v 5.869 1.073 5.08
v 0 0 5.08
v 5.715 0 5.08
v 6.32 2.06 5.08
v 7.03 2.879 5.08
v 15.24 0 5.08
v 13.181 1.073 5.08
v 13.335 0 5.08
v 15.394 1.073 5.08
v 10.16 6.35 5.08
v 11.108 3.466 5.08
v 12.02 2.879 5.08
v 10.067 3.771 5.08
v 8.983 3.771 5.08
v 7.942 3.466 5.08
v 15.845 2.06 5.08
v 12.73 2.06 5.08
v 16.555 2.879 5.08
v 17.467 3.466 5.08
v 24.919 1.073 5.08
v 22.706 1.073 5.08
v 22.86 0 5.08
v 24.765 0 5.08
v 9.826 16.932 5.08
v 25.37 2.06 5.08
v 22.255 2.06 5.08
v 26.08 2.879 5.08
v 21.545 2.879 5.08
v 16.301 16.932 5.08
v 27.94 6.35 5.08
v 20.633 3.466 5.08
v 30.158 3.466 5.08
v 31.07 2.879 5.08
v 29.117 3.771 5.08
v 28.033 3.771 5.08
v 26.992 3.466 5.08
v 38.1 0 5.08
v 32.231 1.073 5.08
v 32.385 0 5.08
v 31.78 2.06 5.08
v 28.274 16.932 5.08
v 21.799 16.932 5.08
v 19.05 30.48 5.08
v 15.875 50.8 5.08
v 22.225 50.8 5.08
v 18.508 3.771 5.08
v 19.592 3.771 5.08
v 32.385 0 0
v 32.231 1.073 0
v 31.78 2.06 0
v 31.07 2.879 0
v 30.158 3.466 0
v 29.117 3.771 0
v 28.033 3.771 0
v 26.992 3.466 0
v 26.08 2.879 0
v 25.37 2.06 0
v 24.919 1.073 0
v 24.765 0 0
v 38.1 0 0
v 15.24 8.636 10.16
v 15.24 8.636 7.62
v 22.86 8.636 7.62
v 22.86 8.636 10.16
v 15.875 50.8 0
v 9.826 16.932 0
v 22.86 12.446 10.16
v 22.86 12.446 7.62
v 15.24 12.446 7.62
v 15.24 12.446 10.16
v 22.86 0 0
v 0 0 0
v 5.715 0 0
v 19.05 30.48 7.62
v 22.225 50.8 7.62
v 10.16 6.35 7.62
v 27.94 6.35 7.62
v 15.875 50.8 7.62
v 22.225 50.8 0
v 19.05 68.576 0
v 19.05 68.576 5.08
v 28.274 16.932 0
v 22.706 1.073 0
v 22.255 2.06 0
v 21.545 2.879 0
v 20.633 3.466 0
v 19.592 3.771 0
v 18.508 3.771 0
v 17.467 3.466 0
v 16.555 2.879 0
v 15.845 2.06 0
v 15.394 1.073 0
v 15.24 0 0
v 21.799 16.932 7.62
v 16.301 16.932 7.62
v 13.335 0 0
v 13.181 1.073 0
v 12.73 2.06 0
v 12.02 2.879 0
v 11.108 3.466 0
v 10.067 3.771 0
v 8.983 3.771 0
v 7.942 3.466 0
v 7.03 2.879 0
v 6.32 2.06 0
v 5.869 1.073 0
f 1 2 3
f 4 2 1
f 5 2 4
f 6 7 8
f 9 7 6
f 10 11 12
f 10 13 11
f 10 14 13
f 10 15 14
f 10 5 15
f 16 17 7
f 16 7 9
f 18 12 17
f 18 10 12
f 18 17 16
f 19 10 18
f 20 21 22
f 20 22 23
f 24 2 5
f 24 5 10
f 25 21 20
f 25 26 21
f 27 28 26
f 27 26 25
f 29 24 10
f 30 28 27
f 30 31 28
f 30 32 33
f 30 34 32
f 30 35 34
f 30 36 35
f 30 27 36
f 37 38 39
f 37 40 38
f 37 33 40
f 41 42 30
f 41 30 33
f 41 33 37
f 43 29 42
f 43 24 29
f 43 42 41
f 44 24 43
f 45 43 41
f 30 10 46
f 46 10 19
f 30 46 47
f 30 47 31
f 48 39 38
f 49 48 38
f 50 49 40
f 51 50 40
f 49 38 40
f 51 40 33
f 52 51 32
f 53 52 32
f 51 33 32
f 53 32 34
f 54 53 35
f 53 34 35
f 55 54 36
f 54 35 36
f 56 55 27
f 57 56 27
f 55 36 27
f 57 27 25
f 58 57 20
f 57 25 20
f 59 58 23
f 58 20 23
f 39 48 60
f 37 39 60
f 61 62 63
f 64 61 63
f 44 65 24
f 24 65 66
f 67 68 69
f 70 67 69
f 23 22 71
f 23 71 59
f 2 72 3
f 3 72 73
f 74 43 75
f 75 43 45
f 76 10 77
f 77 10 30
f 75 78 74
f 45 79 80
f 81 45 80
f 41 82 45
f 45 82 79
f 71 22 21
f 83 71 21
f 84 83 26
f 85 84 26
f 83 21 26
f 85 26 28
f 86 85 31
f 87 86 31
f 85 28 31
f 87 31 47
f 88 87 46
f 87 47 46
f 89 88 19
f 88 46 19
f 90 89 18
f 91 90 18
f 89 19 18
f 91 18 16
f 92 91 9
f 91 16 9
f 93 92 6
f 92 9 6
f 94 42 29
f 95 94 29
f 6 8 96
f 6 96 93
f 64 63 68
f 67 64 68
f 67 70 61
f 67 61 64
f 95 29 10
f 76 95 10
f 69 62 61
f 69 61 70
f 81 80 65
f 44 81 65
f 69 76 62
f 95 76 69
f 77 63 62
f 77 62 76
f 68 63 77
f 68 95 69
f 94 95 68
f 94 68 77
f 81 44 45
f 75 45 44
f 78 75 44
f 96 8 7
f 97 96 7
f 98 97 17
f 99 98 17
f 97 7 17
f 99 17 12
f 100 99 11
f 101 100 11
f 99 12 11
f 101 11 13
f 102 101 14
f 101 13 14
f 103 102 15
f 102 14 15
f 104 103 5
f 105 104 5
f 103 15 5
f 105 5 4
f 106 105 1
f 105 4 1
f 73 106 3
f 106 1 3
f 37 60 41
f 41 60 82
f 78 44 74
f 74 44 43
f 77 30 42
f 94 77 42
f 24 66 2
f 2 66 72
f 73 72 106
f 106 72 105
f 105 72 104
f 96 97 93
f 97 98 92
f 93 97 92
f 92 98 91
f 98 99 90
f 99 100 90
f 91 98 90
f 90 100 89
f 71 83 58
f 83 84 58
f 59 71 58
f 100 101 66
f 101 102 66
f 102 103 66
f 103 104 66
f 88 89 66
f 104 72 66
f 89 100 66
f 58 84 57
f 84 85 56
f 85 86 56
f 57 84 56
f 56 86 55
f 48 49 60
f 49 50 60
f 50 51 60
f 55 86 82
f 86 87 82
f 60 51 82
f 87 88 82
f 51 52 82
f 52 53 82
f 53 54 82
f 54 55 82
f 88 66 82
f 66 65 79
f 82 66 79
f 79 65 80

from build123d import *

# Parameters (mm, degrees)
F1_DEPTH = 5.08
F2_DEPTH = 7.62
F0_W     = 3.81
F0_H     = 3.81
F3_DEPTH = 10.16
F4_DEPTH = 7.62
F5_D     = 7.62
F6_D     = 7.62


with BuildPart() as f1:
    # F0 (on Top) → F1 (new body)
    with BuildSketch(Plane.XY):
        Polygon((9.825618, 16.93164), (0, 0), (19.05, 0), (19.05, 6.35), (10.16, 6.35), (16.300643, 16.93164), align=None)
        Polygon((19.05, 6.35), (19.05, 0), (38.1, 0), (28.274382, 16.93164), (21.799357, 16.93164), (27.94, 6.35), align=None)
        Polygon((21.799357, 16.93164), (28.274382, 16.93164), (22.225, 50.8), (19.05, 30.48), (19.05, 16.93164), align=None)
        Polygon((15.875, 50.8), (9.825618, 16.93164), (16.300643, 16.93164), (19.05, 16.93164), (19.05, 30.48), align=None)
        Polygon((19.05, 68.575706), (15.875, 50.8), (19.05, 50.8), (22.225, 50.8), align=None)
        Polygon((22.225, 50.8), (19.05, 50.8), (19.05, 30.48), align=None)
        Polygon((19.05, 50.8), (15.875, 50.8), (19.05, 30.48), align=None)
    extrude(amount=F1_DEPTH)

    # F0 (on Top) → F2 (join)
    with BuildSketch(Plane.XY):
        Polygon((10.16, 6.35), (19.05, 6.35), (19.05, 8.636), (15.24, 8.636), (15.24, 12.446), (19.05, 12.446), (19.05, 16.93164), (16.300643, 16.93164), align=None)
        Polygon((19.05, 8.636), (19.05, 6.35), (27.94, 6.35), (21.799357, 16.93164), (19.05, 16.93164), (19.05, 12.446), (22.86, 12.446), (22.86, 8.636), align=None)
    extrude(amount=F2_DEPTH)

    # F0 (on Top) → F3 (join)
    with BuildSketch(Plane.XY):
        with Locations((17.145, 10.541)):
            Rectangle(F0_W, F0_H)
        with Locations((20.955, 10.541)):
            Rectangle(F0_W, F0_H)
    extrude(amount=F3_DEPTH)

    # F0 (on Top) → F4 (join)
    with BuildSketch(Plane.XY):
        Polygon((19.05, 50.8), (15.875, 50.8), (19.05, 30.48), align=None)
        Polygon((22.225, 50.8), (19.05, 50.8), (19.05, 30.48), align=None)
    extrude(amount=F4_DEPTH)

    # F5 (through all)
    with Locations(Plane(origin=(0, 0, 0), x_dir=(1, 0, 0), z_dir=(0, 0, -1))):
        with Locations((19.05, 0)):
            Hole(F5_D / 2)

    # F6 (through all)
    with Locations(Plane(origin=(0, 0, 0), x_dir=(1, 0, 0), z_dir=(0, 0, -1))):
        with Locations((9.525, 0), (28.575, 0)):
            Hole(F6_D / 2)


solid = f1.part
